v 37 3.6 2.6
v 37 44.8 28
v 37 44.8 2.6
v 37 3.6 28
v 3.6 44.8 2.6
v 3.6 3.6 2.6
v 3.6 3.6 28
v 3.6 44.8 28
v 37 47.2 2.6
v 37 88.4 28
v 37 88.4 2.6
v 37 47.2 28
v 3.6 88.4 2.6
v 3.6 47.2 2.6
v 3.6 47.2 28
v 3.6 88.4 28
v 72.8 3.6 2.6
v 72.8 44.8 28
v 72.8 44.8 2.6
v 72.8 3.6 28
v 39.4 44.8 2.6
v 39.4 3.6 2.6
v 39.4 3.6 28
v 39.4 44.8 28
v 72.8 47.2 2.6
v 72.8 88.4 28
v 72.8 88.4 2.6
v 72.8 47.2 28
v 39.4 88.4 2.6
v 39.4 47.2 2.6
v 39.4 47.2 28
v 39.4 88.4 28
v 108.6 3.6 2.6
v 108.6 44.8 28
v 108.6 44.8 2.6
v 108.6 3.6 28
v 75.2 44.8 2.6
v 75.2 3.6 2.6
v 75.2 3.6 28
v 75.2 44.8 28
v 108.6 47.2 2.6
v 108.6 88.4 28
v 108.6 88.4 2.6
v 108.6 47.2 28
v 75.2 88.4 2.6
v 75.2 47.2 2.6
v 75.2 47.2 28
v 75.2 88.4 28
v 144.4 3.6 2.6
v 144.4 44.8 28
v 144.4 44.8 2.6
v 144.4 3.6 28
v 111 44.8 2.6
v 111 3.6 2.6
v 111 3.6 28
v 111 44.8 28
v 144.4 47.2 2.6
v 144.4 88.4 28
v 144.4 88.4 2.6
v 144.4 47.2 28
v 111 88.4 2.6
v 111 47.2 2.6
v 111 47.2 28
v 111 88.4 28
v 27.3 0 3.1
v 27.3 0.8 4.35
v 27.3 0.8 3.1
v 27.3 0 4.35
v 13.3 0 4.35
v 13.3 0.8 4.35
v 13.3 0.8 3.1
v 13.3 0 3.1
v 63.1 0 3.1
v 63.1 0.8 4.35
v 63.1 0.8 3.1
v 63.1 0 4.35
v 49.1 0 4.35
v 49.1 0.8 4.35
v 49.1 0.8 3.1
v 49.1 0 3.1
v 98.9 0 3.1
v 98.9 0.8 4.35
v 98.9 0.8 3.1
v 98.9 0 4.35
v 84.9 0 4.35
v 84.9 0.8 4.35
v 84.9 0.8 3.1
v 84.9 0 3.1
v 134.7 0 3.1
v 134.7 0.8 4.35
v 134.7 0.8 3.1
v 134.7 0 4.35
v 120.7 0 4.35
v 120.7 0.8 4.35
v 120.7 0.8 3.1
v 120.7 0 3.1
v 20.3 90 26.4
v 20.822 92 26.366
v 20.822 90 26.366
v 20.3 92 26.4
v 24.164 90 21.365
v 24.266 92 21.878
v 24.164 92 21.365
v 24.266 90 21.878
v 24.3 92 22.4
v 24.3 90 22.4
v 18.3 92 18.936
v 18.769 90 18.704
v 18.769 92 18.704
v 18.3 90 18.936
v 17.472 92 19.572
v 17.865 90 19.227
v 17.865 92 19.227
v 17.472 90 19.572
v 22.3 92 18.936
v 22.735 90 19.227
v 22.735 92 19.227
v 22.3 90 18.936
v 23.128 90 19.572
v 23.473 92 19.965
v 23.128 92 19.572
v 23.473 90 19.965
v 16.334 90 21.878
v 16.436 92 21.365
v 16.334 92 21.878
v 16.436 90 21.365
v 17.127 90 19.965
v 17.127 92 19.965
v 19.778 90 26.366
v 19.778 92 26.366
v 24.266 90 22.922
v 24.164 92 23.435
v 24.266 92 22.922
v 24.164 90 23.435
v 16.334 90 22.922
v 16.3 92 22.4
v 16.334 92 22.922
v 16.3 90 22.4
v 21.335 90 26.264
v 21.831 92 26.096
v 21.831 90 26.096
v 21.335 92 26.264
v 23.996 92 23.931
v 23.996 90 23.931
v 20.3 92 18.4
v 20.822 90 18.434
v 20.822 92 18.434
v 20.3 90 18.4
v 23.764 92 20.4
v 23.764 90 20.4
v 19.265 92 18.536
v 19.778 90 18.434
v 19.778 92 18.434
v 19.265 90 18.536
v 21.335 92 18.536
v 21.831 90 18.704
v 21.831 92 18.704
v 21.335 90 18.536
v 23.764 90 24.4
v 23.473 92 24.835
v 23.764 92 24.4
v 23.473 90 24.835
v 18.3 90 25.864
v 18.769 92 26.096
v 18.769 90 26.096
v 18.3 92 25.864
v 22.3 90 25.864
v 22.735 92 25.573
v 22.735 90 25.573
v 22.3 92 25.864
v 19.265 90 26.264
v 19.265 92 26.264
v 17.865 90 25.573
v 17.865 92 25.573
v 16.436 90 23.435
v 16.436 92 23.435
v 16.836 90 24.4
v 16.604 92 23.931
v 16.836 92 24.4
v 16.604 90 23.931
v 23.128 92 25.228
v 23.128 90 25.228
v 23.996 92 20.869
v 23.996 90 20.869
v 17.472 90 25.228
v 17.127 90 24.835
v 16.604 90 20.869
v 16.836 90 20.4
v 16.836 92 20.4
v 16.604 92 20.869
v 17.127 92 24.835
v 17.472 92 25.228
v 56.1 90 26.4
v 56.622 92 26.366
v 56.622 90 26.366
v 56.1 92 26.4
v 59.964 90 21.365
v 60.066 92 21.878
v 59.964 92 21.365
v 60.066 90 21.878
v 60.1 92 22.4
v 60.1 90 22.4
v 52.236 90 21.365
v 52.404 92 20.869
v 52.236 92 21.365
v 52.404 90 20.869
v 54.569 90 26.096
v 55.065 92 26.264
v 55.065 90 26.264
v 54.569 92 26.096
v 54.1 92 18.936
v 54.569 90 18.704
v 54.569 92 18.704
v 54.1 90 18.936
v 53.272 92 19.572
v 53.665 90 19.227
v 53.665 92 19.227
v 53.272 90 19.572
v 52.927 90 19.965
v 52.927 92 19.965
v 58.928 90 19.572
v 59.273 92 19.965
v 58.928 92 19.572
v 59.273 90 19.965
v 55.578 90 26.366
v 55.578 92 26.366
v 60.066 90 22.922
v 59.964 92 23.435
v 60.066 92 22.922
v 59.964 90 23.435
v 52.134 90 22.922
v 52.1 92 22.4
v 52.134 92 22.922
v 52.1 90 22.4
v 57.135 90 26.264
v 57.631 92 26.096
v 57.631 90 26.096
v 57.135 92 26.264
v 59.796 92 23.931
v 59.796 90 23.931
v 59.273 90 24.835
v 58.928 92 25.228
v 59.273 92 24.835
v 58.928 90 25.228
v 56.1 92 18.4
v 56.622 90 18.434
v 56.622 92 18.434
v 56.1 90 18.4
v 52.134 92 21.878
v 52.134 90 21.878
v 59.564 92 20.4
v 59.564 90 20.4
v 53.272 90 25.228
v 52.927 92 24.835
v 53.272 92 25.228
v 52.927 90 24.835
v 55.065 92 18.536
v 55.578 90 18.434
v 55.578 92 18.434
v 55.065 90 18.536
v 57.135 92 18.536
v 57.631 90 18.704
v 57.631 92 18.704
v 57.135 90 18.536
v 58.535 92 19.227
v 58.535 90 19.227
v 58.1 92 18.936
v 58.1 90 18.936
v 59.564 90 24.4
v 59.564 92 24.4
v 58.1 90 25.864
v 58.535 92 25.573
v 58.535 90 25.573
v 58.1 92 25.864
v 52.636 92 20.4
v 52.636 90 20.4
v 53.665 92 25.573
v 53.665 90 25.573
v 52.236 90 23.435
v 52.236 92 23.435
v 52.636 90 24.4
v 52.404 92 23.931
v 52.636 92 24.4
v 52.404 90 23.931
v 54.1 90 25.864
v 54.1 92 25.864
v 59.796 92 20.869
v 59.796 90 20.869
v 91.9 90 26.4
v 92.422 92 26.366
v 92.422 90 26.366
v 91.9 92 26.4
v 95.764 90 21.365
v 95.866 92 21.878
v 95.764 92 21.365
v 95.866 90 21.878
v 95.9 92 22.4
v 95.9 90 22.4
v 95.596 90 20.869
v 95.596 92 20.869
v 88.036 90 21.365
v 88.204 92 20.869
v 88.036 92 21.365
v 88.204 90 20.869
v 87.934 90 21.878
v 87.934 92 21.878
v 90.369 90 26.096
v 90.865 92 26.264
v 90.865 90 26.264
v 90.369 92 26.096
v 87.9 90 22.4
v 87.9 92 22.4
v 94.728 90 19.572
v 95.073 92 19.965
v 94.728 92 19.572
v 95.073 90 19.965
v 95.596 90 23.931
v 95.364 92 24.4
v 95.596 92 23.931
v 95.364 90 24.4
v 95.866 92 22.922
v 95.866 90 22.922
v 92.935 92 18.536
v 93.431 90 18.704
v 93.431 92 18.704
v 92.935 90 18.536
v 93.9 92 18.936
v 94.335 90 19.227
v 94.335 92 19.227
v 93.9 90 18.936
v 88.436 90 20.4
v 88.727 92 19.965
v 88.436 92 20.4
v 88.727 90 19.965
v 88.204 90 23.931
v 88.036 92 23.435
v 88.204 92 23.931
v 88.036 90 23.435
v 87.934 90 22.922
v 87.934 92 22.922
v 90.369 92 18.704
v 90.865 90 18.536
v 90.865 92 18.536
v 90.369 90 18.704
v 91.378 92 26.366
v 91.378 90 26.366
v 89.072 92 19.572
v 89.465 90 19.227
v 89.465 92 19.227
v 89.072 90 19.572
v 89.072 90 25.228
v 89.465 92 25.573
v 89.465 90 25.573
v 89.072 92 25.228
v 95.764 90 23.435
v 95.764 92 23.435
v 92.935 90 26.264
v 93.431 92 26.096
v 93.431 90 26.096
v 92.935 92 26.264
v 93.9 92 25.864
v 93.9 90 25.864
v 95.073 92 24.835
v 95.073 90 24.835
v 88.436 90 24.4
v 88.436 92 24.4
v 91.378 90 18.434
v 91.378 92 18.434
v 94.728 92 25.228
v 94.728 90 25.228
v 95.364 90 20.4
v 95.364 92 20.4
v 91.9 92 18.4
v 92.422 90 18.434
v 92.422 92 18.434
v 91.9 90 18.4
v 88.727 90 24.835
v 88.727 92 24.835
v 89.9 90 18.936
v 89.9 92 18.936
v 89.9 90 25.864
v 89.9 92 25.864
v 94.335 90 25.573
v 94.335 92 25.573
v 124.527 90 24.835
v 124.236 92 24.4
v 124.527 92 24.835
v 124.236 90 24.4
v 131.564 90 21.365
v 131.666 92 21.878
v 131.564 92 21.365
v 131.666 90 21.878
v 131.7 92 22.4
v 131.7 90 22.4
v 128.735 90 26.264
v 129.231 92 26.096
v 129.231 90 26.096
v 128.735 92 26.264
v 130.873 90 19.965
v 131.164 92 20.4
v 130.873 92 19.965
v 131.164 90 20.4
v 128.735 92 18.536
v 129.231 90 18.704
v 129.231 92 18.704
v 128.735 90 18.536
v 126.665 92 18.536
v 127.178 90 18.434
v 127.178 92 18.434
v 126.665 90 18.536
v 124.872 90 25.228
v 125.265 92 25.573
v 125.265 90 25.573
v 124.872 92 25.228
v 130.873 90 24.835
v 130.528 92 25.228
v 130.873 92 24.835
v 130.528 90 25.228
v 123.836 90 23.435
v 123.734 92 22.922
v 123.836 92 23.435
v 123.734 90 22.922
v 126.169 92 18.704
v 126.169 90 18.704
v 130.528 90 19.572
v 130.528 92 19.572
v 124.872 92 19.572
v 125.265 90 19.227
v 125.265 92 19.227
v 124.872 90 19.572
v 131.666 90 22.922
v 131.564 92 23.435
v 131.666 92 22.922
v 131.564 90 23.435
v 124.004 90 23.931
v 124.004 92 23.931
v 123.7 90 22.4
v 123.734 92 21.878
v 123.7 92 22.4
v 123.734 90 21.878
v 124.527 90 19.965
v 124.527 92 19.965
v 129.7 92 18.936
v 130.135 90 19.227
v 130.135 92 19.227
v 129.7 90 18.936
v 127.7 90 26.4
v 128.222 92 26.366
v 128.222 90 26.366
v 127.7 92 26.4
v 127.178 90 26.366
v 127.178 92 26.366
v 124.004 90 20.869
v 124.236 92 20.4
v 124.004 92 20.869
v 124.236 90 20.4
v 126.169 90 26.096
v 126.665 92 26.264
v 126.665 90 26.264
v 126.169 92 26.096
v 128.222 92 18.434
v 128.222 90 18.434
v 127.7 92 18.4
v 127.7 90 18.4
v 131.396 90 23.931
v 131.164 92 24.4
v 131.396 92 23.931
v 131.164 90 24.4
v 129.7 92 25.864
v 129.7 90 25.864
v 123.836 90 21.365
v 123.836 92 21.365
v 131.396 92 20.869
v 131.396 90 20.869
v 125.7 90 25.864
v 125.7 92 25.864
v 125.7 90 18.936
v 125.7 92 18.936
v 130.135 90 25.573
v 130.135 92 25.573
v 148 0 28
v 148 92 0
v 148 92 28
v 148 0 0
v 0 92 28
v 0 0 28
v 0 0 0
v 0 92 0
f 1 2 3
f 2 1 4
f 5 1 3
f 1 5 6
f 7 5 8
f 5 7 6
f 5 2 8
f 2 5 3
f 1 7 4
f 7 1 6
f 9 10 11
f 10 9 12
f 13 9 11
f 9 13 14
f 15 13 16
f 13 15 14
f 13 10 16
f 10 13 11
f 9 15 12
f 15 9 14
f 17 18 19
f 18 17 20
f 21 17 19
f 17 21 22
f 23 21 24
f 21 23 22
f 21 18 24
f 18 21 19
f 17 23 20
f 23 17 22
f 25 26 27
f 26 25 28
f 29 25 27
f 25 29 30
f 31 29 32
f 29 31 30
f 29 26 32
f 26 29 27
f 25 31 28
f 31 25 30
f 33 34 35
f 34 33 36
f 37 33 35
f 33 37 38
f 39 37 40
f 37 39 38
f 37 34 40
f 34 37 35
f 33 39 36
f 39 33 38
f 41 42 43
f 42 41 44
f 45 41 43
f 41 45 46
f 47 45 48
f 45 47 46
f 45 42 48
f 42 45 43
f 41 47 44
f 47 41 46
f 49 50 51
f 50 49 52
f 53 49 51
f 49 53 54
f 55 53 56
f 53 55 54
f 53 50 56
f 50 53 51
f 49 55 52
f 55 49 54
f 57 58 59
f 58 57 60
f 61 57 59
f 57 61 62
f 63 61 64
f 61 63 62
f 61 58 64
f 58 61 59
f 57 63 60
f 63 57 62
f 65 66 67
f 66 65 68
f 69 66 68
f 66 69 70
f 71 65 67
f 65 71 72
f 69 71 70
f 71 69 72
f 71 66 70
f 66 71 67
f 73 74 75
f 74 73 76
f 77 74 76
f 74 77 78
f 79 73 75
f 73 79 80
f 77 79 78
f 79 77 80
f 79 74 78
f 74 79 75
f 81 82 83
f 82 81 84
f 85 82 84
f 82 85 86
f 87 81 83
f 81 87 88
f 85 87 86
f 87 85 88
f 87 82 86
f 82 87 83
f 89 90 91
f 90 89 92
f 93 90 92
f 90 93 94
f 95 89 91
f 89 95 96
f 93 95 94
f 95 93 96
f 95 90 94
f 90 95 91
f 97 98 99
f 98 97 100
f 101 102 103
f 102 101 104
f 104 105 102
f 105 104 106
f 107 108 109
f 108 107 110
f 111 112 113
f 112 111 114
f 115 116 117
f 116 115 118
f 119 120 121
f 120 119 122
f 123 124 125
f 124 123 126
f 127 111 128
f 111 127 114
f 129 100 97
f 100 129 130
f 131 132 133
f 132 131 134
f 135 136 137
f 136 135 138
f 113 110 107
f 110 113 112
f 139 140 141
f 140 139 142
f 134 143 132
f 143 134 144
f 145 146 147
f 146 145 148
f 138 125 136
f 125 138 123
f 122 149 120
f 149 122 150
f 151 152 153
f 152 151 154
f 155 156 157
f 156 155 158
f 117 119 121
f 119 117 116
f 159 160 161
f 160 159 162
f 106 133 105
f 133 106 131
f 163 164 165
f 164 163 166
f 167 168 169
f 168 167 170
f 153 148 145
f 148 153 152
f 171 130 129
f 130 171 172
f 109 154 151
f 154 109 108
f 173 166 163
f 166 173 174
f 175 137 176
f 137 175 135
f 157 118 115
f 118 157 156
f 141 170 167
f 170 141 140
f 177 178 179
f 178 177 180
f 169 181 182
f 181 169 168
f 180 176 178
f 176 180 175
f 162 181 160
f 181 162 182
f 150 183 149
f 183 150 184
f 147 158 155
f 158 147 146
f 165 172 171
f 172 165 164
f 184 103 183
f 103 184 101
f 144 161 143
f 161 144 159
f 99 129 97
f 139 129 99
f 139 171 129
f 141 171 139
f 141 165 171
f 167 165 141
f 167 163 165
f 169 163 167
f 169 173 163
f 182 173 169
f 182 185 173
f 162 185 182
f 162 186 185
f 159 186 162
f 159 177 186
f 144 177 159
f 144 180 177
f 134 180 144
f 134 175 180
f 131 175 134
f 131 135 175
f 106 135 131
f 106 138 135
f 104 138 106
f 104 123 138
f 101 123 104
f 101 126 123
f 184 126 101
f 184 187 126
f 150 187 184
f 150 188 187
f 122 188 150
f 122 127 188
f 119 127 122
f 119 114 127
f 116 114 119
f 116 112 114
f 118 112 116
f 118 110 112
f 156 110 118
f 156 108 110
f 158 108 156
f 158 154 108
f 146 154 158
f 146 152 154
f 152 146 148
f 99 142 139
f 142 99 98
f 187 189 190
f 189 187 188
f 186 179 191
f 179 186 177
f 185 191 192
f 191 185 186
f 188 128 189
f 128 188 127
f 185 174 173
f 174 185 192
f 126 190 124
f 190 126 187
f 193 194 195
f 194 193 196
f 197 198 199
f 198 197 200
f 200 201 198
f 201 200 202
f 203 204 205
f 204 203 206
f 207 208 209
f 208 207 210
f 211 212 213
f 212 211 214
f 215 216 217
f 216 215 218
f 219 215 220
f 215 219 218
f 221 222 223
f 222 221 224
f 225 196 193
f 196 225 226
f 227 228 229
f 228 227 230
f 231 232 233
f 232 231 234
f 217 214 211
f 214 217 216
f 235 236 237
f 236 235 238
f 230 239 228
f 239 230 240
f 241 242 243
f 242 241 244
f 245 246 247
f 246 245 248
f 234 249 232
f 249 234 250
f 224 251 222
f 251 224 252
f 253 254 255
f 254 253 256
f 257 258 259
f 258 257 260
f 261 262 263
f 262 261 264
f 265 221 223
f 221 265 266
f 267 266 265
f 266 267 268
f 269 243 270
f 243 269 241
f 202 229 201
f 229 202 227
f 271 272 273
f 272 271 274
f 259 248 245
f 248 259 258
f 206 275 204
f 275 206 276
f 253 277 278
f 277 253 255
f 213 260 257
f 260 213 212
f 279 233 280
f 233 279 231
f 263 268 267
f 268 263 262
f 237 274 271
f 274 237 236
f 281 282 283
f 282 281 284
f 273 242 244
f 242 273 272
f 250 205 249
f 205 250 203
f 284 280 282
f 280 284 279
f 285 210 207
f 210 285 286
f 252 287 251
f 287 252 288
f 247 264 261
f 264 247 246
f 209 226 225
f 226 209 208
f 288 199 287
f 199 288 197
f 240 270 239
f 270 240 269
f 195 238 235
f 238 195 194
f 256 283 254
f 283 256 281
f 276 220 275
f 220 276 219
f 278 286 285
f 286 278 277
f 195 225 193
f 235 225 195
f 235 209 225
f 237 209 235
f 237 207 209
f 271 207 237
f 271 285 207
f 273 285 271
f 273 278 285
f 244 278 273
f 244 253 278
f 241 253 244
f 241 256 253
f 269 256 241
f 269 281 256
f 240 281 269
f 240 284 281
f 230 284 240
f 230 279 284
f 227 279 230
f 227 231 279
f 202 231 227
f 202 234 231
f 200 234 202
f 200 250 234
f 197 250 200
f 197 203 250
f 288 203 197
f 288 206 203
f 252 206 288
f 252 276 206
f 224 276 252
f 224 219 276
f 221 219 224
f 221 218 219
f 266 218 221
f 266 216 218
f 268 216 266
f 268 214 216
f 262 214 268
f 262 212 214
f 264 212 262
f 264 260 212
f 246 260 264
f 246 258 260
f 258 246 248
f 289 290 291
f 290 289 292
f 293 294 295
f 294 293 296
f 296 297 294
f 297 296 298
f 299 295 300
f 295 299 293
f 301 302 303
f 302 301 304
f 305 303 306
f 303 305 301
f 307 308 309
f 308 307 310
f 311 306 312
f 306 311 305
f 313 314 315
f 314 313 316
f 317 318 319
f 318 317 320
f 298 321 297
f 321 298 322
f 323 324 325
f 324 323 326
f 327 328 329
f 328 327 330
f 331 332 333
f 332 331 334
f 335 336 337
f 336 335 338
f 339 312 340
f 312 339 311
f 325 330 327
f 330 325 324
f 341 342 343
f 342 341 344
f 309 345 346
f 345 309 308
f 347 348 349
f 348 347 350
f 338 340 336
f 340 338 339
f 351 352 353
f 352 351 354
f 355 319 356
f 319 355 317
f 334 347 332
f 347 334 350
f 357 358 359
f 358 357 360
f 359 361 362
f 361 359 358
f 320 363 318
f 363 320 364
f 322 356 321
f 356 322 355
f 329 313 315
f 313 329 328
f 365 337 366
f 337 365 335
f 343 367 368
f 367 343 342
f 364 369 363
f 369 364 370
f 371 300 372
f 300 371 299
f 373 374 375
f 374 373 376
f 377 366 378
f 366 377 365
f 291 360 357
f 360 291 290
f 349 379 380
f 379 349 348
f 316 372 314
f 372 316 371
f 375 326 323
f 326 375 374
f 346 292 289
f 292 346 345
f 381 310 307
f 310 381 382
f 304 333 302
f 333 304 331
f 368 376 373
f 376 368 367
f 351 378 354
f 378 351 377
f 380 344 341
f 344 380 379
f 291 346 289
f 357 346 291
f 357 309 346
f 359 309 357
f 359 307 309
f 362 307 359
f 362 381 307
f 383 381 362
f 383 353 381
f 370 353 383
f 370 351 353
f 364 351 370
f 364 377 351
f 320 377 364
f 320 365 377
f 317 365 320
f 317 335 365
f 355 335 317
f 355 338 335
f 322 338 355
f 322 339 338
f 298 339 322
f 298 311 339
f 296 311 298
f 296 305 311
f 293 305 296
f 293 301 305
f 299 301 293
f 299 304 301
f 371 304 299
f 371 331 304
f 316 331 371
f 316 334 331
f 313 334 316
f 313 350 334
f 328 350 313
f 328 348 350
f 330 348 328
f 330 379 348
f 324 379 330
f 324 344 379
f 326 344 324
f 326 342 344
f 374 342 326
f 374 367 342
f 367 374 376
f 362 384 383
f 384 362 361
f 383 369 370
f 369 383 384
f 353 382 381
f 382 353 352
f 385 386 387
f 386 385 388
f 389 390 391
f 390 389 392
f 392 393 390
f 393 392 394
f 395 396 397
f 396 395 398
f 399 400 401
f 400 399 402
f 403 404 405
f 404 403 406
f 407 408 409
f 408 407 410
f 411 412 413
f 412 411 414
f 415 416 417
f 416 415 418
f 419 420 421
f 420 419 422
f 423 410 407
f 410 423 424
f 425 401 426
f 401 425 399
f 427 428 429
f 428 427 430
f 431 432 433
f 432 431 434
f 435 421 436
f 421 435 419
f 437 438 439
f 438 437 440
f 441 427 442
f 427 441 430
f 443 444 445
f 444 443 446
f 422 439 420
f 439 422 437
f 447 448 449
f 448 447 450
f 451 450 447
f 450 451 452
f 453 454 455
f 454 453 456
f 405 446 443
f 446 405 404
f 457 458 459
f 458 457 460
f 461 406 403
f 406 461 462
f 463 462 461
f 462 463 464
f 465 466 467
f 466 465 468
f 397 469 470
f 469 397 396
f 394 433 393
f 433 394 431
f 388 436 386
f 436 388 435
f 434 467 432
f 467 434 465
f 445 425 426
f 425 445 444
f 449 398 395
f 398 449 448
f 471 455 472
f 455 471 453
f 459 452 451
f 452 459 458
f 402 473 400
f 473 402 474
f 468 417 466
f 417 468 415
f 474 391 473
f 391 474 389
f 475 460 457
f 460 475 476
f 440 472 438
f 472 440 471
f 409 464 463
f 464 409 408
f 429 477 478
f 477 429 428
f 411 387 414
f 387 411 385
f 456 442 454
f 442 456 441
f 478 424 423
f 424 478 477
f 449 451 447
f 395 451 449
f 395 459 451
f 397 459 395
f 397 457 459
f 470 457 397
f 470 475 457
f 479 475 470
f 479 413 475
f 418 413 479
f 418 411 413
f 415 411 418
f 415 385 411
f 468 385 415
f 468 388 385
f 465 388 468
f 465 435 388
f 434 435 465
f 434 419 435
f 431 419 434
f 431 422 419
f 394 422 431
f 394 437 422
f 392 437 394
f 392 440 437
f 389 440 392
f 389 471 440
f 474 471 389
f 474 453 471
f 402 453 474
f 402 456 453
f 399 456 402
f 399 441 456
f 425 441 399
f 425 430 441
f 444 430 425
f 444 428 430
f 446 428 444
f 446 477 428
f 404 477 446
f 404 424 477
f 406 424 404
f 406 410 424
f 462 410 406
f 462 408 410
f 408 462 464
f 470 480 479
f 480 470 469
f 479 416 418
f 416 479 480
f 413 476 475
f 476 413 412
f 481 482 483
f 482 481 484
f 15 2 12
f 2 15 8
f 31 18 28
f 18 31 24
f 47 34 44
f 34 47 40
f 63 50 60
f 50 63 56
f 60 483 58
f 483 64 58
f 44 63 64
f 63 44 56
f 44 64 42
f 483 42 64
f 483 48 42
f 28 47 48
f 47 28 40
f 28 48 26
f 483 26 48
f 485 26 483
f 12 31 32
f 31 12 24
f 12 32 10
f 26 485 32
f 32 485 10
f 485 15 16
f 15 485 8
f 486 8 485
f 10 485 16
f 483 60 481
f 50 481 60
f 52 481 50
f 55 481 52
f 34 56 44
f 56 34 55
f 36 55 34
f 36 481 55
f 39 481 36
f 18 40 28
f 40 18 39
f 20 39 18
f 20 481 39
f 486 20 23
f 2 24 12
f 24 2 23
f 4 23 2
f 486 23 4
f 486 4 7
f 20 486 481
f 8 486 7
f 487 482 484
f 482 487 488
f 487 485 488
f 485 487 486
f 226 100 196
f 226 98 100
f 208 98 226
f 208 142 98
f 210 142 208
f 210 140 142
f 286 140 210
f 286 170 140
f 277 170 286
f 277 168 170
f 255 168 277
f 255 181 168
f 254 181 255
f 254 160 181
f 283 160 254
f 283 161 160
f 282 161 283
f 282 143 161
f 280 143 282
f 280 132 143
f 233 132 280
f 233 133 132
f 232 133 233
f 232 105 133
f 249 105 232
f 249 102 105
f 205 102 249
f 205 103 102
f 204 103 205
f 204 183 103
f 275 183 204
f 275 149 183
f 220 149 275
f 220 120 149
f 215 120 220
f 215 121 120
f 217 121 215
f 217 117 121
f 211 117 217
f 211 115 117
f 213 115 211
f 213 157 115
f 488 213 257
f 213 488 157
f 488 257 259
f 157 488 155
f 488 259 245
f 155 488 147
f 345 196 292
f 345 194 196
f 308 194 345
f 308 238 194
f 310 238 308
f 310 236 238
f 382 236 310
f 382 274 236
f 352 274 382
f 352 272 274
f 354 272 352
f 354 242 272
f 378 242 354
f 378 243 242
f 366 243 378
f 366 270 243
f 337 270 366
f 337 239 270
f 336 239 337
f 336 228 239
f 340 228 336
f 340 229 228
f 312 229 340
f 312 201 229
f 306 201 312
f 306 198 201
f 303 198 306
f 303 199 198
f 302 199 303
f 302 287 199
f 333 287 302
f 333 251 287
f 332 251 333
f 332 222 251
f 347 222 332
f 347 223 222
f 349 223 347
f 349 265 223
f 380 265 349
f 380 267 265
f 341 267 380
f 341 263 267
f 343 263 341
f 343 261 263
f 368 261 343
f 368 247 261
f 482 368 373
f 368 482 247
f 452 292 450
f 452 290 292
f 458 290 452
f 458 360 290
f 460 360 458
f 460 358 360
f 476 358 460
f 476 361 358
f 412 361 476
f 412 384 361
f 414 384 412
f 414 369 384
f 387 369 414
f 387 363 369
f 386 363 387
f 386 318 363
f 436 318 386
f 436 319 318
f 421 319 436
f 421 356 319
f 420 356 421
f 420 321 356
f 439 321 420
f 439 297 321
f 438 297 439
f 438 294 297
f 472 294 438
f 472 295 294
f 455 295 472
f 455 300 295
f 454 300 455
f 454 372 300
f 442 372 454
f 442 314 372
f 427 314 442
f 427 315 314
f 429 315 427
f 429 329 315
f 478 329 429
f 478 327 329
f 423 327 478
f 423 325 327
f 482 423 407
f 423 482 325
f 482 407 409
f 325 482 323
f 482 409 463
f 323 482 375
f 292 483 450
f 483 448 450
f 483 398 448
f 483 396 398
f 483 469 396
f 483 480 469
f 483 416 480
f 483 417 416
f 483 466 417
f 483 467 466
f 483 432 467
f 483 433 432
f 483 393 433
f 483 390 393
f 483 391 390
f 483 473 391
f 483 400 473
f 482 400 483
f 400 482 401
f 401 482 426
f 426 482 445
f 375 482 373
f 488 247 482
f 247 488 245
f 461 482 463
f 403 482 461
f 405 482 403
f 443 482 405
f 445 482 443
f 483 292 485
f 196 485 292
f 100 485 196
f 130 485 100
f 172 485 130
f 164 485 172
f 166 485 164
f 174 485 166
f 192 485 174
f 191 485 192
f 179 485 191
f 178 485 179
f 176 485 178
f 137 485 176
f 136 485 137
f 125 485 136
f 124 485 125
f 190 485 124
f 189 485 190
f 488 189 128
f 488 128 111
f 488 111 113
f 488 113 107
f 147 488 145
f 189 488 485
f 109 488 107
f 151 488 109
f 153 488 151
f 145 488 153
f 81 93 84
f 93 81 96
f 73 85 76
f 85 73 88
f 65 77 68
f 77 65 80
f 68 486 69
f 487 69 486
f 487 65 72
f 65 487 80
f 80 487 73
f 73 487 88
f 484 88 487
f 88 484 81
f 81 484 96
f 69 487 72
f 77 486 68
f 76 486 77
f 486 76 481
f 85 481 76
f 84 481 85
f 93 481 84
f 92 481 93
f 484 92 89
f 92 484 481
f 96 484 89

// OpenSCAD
// Original V1.5 candidate CAD. Z-up millimeters; prototype, not production certified.
$fn = 48;
outer_x = 148; outer_y = 92; height = 28;
base = 2.6; wall = 2.4; cols = 4; rows = 2;
label_recess = 0.8;
assert(base >= 2 && wall >= 2 && height > base + 8);
assert(cols > 0 && rows > 0);
inner_x = outer_x - 2*wall;
inner_y = outer_y - 2*wall;
cell_x = inner_x / cols;
cell_y = inner_y / rows;
assert(cell_x > 2*wall + 8 && cell_y > 2*wall + 8);
difference() {
  cube([outer_x,outer_y,height]);
  // Individually cut pockets leave shared compartment walls and a 2.6-mm base.
  for (c=[0:cols-1], r=[0:rows-1])
    translate([wall+c*cell_x+wall/2, wall+r*cell_y+wall/2, base])
      cube([cell_x-wall, cell_y-wall, height+1]);
  // Recessed label notches fit inside the declared 148x92x28-mm envelope.
  for (c=[0:cols-1])
    translate([wall+c*cell_x+cell_x/2-7,-0.1,3.1])
      cube([14,label_recess+0.1,1.25]);
  // Rounded rear finger scoops avoid coincident/tangent top faces.
  for (c=[0:cols-1])
    translate([wall+c*cell_x+cell_x/2,outer_y-2.0,height-5.6])
      rotate([-90,0,0]) cylinder(h=3,d=8);
}
